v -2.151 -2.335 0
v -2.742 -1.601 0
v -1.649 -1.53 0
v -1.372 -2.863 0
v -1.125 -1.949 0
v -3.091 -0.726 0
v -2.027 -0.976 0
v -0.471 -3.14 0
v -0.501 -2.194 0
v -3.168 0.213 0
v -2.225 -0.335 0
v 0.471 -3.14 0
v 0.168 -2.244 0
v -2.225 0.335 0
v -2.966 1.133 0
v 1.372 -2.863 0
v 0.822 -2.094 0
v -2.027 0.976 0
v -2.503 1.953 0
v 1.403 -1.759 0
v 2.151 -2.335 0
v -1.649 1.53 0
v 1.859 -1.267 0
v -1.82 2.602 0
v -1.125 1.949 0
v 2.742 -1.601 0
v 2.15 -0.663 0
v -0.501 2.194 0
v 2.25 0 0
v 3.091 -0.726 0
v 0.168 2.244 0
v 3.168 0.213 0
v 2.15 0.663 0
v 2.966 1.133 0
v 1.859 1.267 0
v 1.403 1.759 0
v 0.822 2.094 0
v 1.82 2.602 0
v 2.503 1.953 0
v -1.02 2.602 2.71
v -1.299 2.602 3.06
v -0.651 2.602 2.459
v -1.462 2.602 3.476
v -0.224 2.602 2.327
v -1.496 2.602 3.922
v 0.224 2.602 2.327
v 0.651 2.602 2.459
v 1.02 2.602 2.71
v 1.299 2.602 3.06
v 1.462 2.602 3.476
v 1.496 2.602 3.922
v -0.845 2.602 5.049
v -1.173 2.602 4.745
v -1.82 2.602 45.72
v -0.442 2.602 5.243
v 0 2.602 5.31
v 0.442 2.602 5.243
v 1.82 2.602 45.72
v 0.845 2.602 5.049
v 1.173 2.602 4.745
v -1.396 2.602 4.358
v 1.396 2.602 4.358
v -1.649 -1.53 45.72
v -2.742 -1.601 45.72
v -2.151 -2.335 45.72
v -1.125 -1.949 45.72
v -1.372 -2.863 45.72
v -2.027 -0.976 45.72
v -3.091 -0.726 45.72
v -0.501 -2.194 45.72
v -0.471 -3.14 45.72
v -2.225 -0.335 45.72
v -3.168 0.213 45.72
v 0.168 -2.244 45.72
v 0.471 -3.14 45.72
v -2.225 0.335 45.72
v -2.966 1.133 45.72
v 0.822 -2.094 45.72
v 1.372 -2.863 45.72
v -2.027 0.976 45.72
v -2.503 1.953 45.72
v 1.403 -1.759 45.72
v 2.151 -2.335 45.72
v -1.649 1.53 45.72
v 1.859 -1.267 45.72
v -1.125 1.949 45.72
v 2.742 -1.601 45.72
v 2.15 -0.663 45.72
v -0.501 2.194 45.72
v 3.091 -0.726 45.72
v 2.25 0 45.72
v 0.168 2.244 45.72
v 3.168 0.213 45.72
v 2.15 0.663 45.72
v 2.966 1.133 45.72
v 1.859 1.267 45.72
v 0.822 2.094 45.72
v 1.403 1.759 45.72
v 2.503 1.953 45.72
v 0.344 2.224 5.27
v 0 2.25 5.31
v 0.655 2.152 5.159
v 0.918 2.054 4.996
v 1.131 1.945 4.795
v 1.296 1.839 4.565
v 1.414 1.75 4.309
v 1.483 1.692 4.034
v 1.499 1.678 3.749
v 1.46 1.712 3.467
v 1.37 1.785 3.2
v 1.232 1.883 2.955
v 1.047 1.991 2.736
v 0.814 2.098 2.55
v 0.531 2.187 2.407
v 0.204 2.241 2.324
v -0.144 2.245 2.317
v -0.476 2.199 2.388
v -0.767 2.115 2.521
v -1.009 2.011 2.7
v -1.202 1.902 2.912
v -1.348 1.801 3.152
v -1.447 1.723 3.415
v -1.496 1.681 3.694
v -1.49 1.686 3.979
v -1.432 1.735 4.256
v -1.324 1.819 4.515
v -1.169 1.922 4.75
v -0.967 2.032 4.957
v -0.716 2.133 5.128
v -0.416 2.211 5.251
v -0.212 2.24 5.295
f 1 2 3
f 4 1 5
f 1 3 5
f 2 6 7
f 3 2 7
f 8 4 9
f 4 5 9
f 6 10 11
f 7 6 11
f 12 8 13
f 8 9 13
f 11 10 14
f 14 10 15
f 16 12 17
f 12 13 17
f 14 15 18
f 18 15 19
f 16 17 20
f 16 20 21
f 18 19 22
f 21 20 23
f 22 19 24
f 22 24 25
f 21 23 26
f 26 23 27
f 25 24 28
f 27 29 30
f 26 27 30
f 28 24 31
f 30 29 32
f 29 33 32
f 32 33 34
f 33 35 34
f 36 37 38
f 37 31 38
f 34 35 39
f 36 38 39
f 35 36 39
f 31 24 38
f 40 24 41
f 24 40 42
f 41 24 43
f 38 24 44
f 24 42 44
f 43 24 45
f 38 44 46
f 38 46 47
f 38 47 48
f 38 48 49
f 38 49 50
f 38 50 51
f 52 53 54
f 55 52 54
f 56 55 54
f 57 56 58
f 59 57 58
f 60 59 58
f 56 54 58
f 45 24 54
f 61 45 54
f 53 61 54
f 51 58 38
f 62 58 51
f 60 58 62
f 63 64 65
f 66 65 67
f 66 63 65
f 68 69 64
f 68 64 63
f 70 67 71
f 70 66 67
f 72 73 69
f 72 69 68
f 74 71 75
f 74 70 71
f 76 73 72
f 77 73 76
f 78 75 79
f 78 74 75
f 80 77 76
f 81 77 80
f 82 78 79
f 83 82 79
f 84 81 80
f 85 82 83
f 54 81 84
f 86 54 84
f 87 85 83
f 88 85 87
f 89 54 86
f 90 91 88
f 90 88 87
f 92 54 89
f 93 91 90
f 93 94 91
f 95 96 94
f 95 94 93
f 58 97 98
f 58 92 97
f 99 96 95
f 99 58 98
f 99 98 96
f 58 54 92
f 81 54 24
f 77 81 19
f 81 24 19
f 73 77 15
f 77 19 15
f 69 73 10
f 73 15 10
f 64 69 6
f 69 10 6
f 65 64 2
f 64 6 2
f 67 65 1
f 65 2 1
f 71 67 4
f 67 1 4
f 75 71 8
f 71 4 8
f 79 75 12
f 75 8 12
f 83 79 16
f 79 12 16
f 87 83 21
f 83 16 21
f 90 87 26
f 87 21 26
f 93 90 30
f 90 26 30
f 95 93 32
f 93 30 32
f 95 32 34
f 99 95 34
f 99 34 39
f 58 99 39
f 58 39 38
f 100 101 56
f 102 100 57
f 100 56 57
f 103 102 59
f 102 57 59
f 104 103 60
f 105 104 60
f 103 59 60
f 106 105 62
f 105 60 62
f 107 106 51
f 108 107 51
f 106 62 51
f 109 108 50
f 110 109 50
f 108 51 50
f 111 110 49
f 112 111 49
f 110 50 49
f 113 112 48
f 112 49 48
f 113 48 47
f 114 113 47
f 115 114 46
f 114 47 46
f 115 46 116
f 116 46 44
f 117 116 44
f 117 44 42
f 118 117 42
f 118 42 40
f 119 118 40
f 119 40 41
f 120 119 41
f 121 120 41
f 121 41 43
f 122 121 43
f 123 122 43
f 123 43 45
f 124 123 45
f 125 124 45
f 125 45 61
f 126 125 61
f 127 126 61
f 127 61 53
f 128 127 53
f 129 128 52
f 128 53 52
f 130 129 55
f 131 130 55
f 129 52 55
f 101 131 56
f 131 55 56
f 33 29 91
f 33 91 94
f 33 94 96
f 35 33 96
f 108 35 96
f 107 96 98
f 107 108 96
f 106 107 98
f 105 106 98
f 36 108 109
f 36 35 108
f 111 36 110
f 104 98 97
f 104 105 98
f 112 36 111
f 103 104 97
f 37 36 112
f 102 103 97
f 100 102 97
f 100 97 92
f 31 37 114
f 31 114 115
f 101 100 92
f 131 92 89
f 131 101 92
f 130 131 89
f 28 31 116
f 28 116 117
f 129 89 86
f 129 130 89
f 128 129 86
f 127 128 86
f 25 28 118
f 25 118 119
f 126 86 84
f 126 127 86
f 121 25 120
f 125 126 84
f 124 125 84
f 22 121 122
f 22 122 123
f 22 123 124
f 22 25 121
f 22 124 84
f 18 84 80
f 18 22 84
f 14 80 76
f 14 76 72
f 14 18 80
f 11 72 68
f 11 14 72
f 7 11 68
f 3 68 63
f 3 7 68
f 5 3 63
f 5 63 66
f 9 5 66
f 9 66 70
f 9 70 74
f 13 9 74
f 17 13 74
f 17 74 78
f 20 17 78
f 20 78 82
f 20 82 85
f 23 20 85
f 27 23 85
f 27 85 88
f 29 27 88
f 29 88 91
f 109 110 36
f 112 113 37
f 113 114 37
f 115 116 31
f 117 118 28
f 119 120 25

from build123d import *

# Parameters (mm, degrees)
SKETCH1_R           = 3.175
SKETCH1_R_2         = 2.25
BOSS_EXTRUDE1_DEPTH = 45.72
SKETCH2_W           = 3.810610938
SKETCH2_H           = 3.347268665
CUT_EXTRUDE1_DEPTH  = 48.514
SKETCH3_R           = 1.5
CUT_EXTRUDE2_DEPTH  = 2.54


with BuildPart() as part:
    # Sketch1 → Boss-Extrude1 (new body)
    with BuildSketch(Plane.XY):
        Circle(SKETCH1_R)
        Circle(SKETCH1_R_2, mode=Mode.SUBTRACT)
    extrude(amount=BOSS_EXTRUDE1_DEPTH)

    # Sketch2 → Cut-Extrude1 (cut)
    with BuildSketch(Plane.XY.offset(45.72)):
        with Locations((0.085656613, 4.275461199)):
            Rectangle(SKETCH2_W, SKETCH2_H)
    extrude(amount=-CUT_EXTRUDE1_DEPTH, mode=Mode.SUBTRACT)

    # Sketch3 → Cut-Extrude2 (cut)
    with BuildSketch(Plane(origin=(0, 2.601826866, 0), x_dir=(1, 0, 0), z_dir=(0, 1, 0))):
        with Locations(Location((0, -3.81, 0), (0, 0, 270))):
            Circle(SKETCH3_R)
    extrude(amount=-CUT_EXTRUDE2_DEPTH, mode=Mode.SUBTRACT)


solid = part.part
